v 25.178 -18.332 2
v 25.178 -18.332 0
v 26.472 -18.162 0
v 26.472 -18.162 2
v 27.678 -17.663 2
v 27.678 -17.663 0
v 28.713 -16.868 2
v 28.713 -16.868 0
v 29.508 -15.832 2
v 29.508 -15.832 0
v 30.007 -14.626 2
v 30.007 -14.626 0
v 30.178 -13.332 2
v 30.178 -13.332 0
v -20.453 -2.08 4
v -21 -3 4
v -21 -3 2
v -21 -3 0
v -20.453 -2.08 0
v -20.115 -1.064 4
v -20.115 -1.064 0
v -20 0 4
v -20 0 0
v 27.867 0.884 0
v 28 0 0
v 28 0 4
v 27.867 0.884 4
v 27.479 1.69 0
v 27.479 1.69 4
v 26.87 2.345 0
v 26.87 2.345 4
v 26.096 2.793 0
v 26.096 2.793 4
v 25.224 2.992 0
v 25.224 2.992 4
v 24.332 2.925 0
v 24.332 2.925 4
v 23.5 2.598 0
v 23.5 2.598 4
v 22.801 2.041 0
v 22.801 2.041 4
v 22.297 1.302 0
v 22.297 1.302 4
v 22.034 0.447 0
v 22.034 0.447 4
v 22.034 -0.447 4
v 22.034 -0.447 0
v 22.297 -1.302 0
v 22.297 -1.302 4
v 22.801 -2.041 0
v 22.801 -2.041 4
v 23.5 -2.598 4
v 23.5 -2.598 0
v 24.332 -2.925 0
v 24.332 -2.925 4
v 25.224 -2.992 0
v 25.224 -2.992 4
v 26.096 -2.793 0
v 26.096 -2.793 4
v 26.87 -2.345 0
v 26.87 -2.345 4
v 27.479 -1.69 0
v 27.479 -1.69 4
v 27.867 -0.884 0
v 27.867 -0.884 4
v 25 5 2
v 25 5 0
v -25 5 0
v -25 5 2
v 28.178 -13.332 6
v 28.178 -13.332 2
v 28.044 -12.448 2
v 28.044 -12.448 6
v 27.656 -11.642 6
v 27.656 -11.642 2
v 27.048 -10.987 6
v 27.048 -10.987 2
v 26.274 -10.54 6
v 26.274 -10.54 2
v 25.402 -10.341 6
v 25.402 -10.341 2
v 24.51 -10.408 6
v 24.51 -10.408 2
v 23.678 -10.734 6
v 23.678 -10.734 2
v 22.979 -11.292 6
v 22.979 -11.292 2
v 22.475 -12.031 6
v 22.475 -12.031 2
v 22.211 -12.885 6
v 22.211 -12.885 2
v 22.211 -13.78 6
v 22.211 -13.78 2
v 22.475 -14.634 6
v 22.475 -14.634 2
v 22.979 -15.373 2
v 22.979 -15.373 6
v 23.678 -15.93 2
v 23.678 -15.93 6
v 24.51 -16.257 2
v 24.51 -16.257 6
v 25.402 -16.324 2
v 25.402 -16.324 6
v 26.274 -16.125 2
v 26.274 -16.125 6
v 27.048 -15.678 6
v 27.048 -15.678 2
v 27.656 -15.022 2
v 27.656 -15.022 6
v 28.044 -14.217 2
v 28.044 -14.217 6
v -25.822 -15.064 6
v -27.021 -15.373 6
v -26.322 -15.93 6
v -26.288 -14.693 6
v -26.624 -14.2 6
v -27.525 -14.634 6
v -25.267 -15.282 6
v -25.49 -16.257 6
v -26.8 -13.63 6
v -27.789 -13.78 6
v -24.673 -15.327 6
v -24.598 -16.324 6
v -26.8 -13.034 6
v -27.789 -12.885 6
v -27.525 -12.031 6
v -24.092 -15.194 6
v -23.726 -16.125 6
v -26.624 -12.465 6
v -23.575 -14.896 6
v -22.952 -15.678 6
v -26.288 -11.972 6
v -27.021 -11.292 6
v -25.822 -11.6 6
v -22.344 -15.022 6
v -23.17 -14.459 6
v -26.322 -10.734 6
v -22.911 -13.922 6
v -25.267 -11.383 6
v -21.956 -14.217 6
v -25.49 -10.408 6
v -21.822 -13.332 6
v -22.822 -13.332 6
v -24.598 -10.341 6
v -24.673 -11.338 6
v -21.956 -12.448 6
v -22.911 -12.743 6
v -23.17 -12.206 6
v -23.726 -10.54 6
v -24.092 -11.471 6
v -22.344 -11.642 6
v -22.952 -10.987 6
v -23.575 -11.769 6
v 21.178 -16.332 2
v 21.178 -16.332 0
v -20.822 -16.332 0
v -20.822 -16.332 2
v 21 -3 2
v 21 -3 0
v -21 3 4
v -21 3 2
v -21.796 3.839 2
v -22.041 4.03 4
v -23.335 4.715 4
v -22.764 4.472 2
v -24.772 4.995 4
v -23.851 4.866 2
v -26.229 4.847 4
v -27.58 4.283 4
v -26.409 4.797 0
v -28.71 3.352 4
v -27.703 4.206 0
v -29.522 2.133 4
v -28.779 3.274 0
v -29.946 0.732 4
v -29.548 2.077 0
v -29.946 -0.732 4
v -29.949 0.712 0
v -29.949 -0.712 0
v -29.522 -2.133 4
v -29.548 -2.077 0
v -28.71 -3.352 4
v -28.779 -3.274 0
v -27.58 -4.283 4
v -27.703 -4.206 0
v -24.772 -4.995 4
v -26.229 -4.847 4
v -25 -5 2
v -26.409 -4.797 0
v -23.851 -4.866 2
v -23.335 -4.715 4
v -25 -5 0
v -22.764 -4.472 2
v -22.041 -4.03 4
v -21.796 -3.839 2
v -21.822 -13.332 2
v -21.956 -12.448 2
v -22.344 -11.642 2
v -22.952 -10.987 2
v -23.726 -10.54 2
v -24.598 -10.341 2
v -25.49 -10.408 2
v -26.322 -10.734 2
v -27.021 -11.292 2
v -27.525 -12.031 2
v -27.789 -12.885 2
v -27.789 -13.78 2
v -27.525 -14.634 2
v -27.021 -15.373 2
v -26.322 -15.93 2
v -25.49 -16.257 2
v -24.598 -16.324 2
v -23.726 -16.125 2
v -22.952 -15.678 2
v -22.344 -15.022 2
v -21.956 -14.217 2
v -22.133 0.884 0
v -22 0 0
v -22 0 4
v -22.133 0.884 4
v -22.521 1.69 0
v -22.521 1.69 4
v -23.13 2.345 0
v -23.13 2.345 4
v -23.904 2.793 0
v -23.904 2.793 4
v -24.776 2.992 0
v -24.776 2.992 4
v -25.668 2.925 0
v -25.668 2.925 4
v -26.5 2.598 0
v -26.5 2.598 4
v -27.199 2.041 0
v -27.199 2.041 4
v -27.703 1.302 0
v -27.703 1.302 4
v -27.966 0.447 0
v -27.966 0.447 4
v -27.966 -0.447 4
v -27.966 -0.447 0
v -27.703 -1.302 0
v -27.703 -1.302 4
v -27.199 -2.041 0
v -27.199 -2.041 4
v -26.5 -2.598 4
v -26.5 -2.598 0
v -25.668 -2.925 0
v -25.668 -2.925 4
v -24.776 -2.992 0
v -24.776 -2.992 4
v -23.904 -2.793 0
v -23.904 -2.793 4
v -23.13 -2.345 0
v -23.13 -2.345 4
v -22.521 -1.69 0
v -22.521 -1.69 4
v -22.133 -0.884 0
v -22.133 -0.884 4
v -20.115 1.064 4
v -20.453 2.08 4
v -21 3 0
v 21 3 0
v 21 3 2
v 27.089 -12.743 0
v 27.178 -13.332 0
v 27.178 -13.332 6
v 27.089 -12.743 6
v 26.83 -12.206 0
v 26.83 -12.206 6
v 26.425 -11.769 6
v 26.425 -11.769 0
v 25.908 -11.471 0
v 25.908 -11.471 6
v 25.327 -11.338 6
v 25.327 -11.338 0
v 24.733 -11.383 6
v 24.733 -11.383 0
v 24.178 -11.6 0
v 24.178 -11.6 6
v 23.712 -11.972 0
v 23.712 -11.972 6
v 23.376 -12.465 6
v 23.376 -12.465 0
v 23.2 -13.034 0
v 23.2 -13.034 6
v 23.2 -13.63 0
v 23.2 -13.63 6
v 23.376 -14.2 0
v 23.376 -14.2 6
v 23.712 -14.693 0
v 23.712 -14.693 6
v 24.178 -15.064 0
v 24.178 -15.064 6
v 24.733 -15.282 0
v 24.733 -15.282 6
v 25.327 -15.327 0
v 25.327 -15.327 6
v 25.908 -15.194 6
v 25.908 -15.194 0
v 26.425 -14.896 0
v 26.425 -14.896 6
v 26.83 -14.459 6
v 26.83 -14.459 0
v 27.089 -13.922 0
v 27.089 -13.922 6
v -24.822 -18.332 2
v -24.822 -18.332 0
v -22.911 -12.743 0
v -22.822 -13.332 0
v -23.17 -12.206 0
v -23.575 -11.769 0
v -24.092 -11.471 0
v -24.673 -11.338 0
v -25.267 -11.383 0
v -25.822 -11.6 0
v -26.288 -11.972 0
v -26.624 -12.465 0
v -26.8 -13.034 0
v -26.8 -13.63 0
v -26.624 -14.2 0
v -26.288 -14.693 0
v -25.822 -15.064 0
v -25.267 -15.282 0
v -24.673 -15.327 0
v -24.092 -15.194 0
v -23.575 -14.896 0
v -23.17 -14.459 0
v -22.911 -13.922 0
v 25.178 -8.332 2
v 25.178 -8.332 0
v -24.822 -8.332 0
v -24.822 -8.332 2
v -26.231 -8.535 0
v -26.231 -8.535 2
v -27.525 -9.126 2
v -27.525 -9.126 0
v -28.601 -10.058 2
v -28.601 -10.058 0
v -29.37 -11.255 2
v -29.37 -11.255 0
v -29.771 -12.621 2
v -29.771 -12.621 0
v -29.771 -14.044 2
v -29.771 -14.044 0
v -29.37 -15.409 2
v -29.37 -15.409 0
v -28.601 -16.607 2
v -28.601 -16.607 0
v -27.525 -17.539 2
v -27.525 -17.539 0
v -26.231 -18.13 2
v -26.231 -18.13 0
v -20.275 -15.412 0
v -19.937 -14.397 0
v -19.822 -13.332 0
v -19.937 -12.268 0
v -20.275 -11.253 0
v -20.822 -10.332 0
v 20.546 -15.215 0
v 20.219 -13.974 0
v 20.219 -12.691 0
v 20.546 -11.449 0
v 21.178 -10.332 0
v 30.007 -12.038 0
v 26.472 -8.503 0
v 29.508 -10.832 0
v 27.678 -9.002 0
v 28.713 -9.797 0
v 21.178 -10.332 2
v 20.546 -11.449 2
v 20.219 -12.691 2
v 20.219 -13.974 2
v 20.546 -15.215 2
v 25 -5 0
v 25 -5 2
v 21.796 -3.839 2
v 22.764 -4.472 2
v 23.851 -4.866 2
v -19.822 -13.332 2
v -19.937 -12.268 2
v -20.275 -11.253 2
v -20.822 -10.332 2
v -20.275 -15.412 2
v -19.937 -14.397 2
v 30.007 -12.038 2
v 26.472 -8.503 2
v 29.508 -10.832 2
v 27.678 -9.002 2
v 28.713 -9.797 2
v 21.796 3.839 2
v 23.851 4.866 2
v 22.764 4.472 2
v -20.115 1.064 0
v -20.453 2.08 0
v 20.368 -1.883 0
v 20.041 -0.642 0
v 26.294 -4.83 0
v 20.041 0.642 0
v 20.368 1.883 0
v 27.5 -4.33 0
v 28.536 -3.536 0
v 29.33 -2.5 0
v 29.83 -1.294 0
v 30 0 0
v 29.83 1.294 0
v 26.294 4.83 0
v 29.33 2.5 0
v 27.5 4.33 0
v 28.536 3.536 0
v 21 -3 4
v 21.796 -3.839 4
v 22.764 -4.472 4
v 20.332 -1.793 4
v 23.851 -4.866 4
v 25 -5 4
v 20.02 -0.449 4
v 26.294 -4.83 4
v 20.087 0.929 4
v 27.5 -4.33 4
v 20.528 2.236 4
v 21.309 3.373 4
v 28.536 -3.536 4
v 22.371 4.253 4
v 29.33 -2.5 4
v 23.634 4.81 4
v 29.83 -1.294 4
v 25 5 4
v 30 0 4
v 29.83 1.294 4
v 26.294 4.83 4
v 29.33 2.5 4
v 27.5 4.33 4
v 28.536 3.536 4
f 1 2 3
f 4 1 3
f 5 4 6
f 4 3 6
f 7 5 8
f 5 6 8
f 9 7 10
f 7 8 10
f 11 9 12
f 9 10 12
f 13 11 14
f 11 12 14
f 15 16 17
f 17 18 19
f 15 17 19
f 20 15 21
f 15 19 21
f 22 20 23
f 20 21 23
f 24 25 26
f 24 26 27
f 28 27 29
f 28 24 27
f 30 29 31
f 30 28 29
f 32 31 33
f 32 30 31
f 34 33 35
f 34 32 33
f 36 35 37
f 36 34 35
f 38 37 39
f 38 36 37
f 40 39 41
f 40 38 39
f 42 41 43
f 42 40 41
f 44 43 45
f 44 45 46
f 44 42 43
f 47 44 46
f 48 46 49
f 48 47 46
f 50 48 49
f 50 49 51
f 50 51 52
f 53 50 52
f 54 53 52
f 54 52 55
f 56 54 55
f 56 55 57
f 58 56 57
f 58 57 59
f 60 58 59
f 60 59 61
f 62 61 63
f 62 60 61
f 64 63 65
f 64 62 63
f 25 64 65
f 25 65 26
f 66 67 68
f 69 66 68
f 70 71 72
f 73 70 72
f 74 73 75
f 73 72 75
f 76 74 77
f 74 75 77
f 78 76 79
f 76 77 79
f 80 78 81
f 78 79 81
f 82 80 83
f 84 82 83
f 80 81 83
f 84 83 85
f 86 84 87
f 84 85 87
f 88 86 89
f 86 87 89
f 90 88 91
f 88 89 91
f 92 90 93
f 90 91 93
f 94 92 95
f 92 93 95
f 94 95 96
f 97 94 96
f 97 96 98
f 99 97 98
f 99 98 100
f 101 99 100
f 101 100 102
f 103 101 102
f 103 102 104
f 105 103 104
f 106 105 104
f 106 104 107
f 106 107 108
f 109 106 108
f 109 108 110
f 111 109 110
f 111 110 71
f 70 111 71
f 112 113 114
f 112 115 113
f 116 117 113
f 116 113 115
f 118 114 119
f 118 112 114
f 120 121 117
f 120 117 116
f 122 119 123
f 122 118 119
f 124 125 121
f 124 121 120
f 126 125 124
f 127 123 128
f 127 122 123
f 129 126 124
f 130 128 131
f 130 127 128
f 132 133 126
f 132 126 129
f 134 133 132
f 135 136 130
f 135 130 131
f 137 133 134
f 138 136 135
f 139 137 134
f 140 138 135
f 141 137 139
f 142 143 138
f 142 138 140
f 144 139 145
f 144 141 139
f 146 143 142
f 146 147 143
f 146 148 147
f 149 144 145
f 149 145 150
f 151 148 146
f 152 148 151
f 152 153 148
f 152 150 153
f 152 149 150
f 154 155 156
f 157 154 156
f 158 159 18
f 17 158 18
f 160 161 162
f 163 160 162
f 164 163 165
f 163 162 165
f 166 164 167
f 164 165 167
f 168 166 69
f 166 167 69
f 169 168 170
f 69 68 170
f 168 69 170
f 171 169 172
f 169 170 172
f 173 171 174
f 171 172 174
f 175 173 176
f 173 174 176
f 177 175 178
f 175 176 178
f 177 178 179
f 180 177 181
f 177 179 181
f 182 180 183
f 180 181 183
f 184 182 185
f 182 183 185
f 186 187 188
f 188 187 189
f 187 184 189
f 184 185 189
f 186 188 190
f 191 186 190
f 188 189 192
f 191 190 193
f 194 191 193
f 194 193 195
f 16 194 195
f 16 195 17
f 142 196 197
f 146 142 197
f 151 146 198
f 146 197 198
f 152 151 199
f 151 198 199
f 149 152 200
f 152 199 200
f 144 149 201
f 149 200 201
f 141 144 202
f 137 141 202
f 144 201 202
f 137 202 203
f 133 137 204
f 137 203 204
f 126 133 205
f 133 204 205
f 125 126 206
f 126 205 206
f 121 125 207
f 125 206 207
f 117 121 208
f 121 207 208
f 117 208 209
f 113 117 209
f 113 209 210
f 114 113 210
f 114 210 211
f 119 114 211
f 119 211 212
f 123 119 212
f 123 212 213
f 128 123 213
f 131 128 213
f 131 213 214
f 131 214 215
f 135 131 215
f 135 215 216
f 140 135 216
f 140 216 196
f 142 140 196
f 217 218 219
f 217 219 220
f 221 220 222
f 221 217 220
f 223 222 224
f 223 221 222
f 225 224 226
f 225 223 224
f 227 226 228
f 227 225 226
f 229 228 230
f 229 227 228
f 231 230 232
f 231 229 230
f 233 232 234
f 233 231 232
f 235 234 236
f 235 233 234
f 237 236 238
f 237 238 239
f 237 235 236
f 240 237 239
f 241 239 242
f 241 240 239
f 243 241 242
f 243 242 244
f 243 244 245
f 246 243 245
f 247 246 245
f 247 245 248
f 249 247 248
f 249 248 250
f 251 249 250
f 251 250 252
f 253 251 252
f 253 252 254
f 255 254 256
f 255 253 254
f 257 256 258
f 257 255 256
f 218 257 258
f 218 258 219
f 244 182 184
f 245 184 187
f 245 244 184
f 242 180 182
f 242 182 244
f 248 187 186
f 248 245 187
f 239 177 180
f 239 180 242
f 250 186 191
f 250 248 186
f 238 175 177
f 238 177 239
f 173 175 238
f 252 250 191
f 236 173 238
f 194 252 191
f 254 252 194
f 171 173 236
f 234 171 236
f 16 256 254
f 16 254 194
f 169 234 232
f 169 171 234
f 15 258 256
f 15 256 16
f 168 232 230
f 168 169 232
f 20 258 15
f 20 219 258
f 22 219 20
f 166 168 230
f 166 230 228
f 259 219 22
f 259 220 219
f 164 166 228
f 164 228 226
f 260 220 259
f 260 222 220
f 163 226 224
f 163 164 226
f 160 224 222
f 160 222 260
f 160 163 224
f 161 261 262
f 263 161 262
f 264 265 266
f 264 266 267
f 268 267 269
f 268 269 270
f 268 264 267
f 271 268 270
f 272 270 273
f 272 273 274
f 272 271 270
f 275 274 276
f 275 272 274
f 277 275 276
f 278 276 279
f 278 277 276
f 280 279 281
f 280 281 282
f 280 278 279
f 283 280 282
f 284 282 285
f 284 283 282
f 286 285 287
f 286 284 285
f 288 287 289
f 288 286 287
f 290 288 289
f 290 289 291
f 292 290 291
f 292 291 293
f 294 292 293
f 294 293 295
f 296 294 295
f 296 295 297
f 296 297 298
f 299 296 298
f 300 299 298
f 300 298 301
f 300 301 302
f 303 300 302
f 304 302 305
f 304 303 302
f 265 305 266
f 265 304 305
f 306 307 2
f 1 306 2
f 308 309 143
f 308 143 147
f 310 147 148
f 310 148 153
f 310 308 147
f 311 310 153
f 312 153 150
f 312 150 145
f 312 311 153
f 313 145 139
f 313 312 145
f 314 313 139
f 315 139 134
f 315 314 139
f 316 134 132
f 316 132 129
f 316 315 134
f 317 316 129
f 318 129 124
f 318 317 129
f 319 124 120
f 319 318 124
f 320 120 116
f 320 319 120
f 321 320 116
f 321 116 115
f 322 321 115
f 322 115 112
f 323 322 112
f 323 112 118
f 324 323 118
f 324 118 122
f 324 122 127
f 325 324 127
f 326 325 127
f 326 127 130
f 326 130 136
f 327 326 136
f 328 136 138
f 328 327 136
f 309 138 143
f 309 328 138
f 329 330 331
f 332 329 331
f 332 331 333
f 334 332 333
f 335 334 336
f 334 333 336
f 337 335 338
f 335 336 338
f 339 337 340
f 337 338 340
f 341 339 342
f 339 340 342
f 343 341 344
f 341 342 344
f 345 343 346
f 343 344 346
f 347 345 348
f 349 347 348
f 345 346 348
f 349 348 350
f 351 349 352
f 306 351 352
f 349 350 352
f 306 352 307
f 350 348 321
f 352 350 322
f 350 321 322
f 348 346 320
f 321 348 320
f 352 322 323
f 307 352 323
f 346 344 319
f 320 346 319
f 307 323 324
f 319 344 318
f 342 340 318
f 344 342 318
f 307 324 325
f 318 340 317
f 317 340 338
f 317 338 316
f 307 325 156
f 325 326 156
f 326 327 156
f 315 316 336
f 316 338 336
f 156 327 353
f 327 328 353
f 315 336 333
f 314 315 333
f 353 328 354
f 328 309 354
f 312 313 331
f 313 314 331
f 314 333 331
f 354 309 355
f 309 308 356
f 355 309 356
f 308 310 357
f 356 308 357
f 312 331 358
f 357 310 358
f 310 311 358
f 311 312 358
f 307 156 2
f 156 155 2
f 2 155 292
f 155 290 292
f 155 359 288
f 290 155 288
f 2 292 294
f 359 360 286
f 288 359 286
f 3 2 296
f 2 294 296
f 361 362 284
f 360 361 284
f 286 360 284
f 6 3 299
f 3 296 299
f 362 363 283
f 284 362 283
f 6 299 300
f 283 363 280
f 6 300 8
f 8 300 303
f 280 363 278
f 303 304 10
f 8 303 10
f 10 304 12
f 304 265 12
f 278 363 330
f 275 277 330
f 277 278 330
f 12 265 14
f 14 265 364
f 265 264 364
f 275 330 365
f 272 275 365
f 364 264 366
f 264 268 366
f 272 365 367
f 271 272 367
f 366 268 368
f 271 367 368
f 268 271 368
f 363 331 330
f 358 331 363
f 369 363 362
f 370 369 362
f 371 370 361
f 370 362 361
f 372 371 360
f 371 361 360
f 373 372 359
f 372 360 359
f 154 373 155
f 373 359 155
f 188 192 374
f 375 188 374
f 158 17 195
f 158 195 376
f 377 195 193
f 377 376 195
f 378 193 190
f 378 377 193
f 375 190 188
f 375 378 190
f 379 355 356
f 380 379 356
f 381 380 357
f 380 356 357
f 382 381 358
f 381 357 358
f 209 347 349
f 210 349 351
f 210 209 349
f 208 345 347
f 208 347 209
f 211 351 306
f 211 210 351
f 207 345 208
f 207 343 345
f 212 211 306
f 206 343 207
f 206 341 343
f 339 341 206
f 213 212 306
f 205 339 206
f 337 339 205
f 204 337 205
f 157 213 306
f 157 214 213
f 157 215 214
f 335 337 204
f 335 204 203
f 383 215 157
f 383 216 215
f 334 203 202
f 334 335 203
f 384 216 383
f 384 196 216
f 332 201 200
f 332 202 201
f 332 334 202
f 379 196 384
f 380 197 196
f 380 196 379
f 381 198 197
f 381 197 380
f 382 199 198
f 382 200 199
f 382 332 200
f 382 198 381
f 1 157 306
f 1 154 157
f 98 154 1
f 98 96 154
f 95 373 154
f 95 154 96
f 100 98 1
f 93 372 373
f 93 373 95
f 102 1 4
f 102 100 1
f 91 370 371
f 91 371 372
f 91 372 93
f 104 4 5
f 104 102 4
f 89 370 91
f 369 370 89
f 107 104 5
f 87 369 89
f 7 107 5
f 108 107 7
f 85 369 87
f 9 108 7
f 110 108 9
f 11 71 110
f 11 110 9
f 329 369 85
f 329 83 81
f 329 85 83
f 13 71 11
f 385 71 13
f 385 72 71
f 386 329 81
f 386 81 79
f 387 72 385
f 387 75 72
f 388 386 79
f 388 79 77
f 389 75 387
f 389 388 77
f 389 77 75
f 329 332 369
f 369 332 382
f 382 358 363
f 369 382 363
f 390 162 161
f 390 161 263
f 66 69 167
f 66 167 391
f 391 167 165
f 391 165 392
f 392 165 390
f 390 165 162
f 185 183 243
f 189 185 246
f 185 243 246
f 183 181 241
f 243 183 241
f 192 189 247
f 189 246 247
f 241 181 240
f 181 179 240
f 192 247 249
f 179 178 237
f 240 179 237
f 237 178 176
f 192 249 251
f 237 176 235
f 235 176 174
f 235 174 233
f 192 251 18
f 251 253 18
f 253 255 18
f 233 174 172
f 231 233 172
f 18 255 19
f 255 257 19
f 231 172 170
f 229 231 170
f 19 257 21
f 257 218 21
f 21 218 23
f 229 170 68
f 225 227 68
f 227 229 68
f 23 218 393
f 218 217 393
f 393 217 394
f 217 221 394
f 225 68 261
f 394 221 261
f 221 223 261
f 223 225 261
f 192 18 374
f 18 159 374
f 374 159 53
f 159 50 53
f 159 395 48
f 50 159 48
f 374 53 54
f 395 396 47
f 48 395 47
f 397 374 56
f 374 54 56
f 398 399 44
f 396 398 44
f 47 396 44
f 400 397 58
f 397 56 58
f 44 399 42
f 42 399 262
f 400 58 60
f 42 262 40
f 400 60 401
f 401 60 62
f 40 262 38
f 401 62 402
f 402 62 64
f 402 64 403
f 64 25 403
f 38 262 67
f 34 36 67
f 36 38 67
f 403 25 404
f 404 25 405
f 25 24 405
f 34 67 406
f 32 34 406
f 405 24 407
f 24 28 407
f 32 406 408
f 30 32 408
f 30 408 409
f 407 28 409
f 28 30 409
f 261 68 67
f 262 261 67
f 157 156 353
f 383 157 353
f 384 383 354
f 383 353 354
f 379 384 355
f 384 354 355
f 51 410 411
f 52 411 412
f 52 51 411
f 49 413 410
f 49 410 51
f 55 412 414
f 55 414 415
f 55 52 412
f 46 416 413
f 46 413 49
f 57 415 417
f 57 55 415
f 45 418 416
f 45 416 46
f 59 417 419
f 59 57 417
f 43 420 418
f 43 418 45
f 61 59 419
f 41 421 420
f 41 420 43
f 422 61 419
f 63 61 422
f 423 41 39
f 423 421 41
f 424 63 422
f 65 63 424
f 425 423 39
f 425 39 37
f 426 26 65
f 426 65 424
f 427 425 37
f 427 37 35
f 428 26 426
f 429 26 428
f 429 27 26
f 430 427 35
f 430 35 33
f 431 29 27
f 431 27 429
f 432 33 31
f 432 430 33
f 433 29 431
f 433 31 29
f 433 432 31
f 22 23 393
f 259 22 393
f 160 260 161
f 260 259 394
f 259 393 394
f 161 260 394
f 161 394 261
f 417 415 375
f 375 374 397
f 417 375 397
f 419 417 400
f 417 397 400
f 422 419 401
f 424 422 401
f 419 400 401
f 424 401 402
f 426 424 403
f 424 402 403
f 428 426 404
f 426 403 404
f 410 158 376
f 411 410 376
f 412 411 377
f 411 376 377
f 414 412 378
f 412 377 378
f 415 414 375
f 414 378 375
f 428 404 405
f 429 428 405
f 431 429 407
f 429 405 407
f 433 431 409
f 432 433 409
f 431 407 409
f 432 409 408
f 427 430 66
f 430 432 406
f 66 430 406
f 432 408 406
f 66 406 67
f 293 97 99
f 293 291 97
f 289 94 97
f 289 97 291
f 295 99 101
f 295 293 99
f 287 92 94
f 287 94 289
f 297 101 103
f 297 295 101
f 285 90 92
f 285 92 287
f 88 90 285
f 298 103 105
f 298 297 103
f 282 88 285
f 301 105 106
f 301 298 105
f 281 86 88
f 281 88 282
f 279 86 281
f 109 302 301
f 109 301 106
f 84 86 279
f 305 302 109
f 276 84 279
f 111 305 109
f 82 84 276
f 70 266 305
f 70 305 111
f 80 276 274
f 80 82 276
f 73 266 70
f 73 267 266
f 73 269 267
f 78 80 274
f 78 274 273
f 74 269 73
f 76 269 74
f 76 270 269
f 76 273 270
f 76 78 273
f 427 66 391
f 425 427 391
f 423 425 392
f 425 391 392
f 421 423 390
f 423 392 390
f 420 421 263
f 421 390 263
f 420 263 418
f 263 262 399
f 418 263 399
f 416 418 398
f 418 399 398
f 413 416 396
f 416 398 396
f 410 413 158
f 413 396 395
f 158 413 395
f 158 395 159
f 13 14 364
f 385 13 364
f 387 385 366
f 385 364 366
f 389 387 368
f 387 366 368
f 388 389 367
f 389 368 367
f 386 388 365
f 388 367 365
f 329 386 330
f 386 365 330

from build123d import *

# Parameters (mm, degrees)
F0_R     = 3
F1_DEPTH = 4
F2_DEPTH = 2
F3_R     = 3
F4_DEPTH = 2
F3_R_2   = 2
F5_DEPTH = 6


with BuildPart() as f1:
    # F0 (on Top) → F1 (new body)
    with BuildSketch(Plane.XY):
        with BuildLine():
            ThreePointArc((25, -5), (28.5355339059, -3.5355339059), (30, 0))
            ThreePointArc((30, 0), (28.5355339059, 3.5355339059), (25, 5))
            ThreePointArc((25, 5), (22.7639320225, 4.472135955), (21, 3))
            ThreePointArc((21, 3), (20, 0), (21, -3))
            ThreePointArc((21, -3), (22.7639320225, -4.472135955), (25, -5))
        make_face()
        with Locations((25, 0)):
            Circle(F0_R, mode=Mode.SUBTRACT)
    extrude(amount=F1_DEPTH)



with BuildPart() as f1b:
    # F0 (on Top) → F1, piece 2 (new body)
    with BuildSketch(Plane.XY):
        with BuildLine():
            ThreePointArc((-21, 3), (-22.7639320225, 4.472135955), (-25, 5))
            ThreePointArc((-25, 5), (-30, 0), (-25, -5))
            ThreePointArc((-25, -5), (-22.7639320225, -4.472135955), (-21, -3))
            ThreePointArc((-21, -3), (-20.2565835097, -1.5811388301), (-20, 0))
            ThreePointArc((-20, 0), (-20.2565835097, 1.5811388301), (-21, 3))
        make_face()
        with Locations((-25, 0)):
            Circle(F0_R, mode=Mode.SUBTRACT)
    extrude(amount=F1_DEPTH)


with BuildPart() as f1_1:
    add(f1.part)

    add(f1b.part)  # F2 merges F1b
    # F0 (on Top) → F2 (join)
    with BuildSketch(Plane.XY):
        with BuildLine():
            ThreePointArc((21, 3), (22.7639320225, 4.472135955), (25, 5))
            Line((25, 5), (-25, 5))
            ThreePointArc((-25, 5), (-22.7639320225, 4.472135955), (-21, 3))
            Line((-21, 3), (21, 3))
        make_face()
        with BuildLine():
            Line((-25, -5), (25, -5))
            ThreePointArc((25, -5), (22.7639320225, -4.472135955), (21, -3))
            Line((21, -3), (-21, -3))
            ThreePointArc((-21, -3), (-22.7639320225, -4.472135955), (-25, -5))
        make_face()
    extrude(amount=F2_DEPTH)


with BuildPart() as f4:
    # F3 (on Top) → F4 (new body)
    with BuildSketch(Plane.XY):
        with BuildLine():
            ThreePointArc((25.1777654979, -18.3323930204), (28.7132994039, -16.8679269263), (30.1777654979, -13.3323930204))
            ThreePointArc((30.1777654979, -13.3323930204), (28.7132994039, -9.7968591145), (25.1777654979, -8.3323930204))
            ThreePointArc((25.1777654979, -8.3323930204), (22.9416975204, -8.8602570654), (21.1777654979, -10.3323930204))
            ThreePointArc((21.1777654979, -10.3323930204), (20.1777654979, -13.3323930204), (21.1777654979, -16.3323930204))
            ThreePointArc((21.1777654979, -16.3323930204), (22.9416975204, -17.8045289754), (25.1777654979, -18.3323930204))
        make_face()
        with Locations((25.1777654979, -13.3323930204)):
            Circle(F3_R, mode=Mode.SUBTRACT)
        with BuildLine():
            ThreePointArc((21.1777654979, -10.3323930204), (22.9416975204, -8.8602570654), (25.1777654979, -8.3323930204))
            Line((25.1777654979, -8.3323930204), (-24.8222345021, -8.3323930204))
            ThreePointArc((-24.8222345021, -8.3323930204), (-22.5861665246, -8.8602570654), (-20.8222345021, -10.3323930204))
            Line((-20.8222345021, -10.3323930204), (21.1777654979, -10.3323930204))
        make_face()
        with BuildLine():
            Line((-24.8222345021, -18.3323930204), (25.1777654979, -18.3323930204))
            ThreePointArc((25.1777654979, -18.3323930204), (22.9416975204, -17.8045289754), (21.1777654979, -16.3323930204))
            Line((21.1777654979, -16.3323930204), (-20.8222345021, -16.3323930204))
            ThreePointArc((-20.8222345021, -16.3323930204), (-22.5861665246, -17.8045289754), (-24.8222345021, -18.3323930204))
        make_face()
        with BuildLine():
            ThreePointArc((-20.8222345021, -10.3323930204), (-22.5861665246, -8.8602570654), (-24.8222345021, -8.3323930204))
            ThreePointArc((-24.8222345021, -8.3323930204), (-29.8222345021, -13.3323930204), (-24.8222345021, -18.3323930204))
            ThreePointArc((-24.8222345021, -18.3323930204), (-22.5861665246, -17.8045289754), (-20.8222345021, -16.3323930204))
            ThreePointArc((-20.8222345021, -16.3323930204), (-20.0788180118, -14.9135318505), (-19.8222345021, -13.3323930204))
            ThreePointArc((-19.8222345021, -13.3323930204), (-20.0788180118, -11.7512541903), (-20.8222345021, -10.3323930204))
        make_face()
        with Locations((-24.8222345021, -13.3323930204)):
            Circle(F3_R, mode=Mode.SUBTRACT)
    extrude(amount=F4_DEPTH)

    # F3 (on Top) → F5 (join)
    with BuildSketch(Plane.XY):
        with Locations((-24.8222345021, -13.3323930204)):
            Circle(F3_R)
        with Locations((-24.8222345021, -13.3323930204)):
            Circle(F3_R_2, mode=Mode.SUBTRACT)
        with Locations((25.1777654979, -13.3323930204)):
            Circle(F3_R)
        with Locations((25.1777654979, -13.3323930204)):
            Circle(F3_R_2, mode=Mode.SUBTRACT)
    extrude(amount=F5_DEPTH)


solid = Compound([f1_1.part, f4.part])
